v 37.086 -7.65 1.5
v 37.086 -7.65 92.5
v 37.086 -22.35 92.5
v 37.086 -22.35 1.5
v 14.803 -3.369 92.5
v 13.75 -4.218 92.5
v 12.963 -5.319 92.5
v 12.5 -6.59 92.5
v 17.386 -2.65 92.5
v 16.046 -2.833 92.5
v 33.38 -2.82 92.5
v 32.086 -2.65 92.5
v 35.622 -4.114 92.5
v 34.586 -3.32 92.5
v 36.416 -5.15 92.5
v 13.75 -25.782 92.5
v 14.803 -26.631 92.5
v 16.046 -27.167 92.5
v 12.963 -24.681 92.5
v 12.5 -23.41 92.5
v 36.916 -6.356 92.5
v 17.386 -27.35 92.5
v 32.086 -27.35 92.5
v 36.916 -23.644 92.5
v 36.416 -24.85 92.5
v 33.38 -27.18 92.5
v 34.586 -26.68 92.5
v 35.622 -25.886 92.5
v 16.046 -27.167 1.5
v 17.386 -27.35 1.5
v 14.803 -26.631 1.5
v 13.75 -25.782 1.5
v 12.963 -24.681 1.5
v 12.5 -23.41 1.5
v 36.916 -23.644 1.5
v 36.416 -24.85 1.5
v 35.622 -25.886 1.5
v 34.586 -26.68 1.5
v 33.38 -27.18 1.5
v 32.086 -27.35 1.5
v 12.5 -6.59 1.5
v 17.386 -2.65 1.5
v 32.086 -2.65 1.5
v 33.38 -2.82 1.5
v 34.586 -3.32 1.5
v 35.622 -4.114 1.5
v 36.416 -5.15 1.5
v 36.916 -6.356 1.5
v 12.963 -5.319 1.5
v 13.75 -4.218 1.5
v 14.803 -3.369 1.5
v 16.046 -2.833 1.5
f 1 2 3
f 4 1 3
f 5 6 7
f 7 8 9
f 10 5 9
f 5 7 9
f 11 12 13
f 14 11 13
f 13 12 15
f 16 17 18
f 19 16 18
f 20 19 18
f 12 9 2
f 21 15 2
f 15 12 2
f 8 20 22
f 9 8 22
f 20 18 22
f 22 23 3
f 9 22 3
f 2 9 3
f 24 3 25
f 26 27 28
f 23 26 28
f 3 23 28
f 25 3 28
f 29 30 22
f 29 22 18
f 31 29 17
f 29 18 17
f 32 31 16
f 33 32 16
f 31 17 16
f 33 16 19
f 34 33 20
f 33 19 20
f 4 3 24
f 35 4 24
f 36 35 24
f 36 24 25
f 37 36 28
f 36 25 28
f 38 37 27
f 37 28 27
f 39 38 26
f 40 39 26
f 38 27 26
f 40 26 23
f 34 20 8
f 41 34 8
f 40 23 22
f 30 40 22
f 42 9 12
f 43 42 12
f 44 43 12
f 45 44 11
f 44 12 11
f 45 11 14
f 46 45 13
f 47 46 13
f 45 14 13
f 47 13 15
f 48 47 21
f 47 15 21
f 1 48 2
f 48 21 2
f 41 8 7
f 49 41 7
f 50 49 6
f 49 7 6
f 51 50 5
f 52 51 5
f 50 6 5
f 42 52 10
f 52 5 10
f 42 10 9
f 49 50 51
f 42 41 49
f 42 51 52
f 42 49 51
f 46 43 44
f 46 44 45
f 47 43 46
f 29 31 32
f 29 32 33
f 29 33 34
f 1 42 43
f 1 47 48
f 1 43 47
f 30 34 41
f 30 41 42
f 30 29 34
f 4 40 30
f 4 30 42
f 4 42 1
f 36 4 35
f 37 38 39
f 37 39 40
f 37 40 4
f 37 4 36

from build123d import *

# Parameters (mm, degrees)
F0_W         = 80
F0_H         = 60
F1_DEPTH     = 130
F2_T         = -1.5
F3_W         = 1.5
F3_H         = 27
F4_DEPTH     = 91
F5_R         = 1
F6_W         = 17
F6_H         = 16
F6_W_2       = 1.5
F6_H_2       = 27
F7_DEPTH     = 2
F8_T1_DEPTH  = 92
F8_T3_DEPTH  = 29.9726896882
F8_S7_W      = 1
F8_S7_H      = 1
F8_T8_DEPTH  = 1
F8_T15_DEPTH = 29.9726896882
F8_T19_DEPTH = 94.5
F9_T1_DEPTH  = 127.5
F9_T3_DEPTH  = 58.5
F9_S7_W      = 1
F9_S7_H      = 1
F9_T8_DEPTH  = 1
F9_S13_W     = 1
F9_S13_H     = 1
F9_T14_DEPTH = 1
F9_T18_ANGLE = 90
F11_DEPTH    = 60
F12_DEPTH    = 60
F13_DEPTH    = 50
F14_R        = 2
F15_W        = 17
F15_H        = 16
F16_DEPTH    = 91


# Not quite as in the source:
# - a fillet or chamfer that OpenCascade refuses, or shapes differently, is made with other operations: its cross-section is extruded or revolved along the edge and cut away or added


with BuildPart() as f1:
    # F0 (on Top) → F1 (new body)
    with BuildSketch(Plane.XY):
        Rectangle(F0_W, F0_H)
    extrude(amount=F1_DEPTH)

    # F2
    f2_openings = [f1.faces().sort_by_distance(p)[0] for p in [
        (0, 0, 130),
    ]]
    offset(amount=F2_T, openings=f2_openings)

    # F3 (on face) → F4 (join)
    with BuildSketch(Plane.XY.offset(1.5)):
        with Locations((11.75, -15)):
            Rectangle(F3_W, F3_H)
    extrude(amount=F4_DEPTH)

    # F5
    f5_edges = [f1.edges().sort_by_distance(p)[0] for p in [
        (0, 28.5, 1.5),
        (-38.5, 0, 1.5),
        (-13.75, -28.5, 1.5),
        (11, -15, 1.5),
    ]]
    fillet(f5_edges, radius=F5_R)

    # F6 (on face) → F7 (join)
    with BuildSketch(Plane.XY.offset(92.5)):
        Polygon((38.4726896882, -1.5), (12.5, -1.5), (12.5, -28.5), (11, -28.5), (11, -28.532365337), (38.4726896882, -28.532365337), align=None)
        with Locations((24.7363448441, -15)):
            Rectangle(F6_W, F6_H, mode=Mode.SUBTRACT)
        with Locations((11.75, -15)):
            Rectangle(F6_W_2, F6_H_2)
    extrude(amount=F7_DEPTH)

    # F8: fillet of radius 1 on 2 edges, made by hand

    # F8_s2 → F8_t1 (join)
    with BuildSketch(Plane.XY.offset(2.5)):
        with BuildLine():
            ThreePointArc((10, -28.5), (10.7071067812, -28.2071067812), (11, -27.5))
            Line((11, -27.5), (11, -28.5))
            Line((11, -28.5), (10, -28.5))
        make_face()
    extrude(amount=F8_T1_DEPTH)

    # F8_s4 → F8_t3 (join)
    with BuildSketch(Plane.YZ.offset(11)):
        with BuildLine():
            ThreePointArc((-28.5, 95.5), (-28.2071067812, 94.7928932188), (-27.5, 94.5))
            Line((-27.5, 94.5), (-28.5, 94.5))
            Line((-28.5, 94.5), (-28.5, 95.5))
        make_face()
    extrude(amount=F8_T3_DEPTH)


with BuildPart() as f8_tool6:
    # F8_s7 → F8_t8 (new body)
    with BuildSketch(Plane.XZ.offset(27.5)):
        with Locations((10.5, 2)):
            Rectangle(F8_S7_W, F8_S7_H)
    extrude(amount=F8_T8_DEPTH)

    # F8_s9 → F8_t10 (revolve, cut)
    with BuildSketch(Plane(origin=(10, -27.5, 2.5), x_dir=(-0.7071067812, 0, 0.7071067812), z_dir=(0.7071067812, 0, 0.7071067812))):
        with BuildLine():
            ThreePointArc((0, -1), (1, 0), (0, 1))
            Line((0, 1), (0, -1))
        make_face()
    revolve(axis=Axis((10, -27.5, 2.5), (0, -1, 0)), mode=Mode.SUBTRACT)


with BuildPart() as f1_1:
    add(f1.part)

    # F8_t5: union F8_tool6
    add(f8_tool6.part)


with BuildPart() as f8_tool13:
    # F8_s14 → F8_t15 (new body)
    with BuildSketch(Plane.YZ.offset(8.5)):
        with BuildLine():
            ThreePointArc((-28.5, 95.5), (-28.2071067812, 94.7928932188), (-27.5, 94.5))
            Line((-27.5, 94.5), (-28.5, 94.5))
            Line((-28.5, 94.5), (-28.5, 95.5))
        make_face()
    extrude(amount=F8_T15_DEPTH)

    split(bisect_by=Plane.YZ.offset(11), keep=Keep.BOTTOM)


with BuildPart() as f8_tool17:
    # F8_s18 → F8_t19 (new body)
    with BuildSketch(Plane.XY.offset(97)):
        with BuildLine():
            ThreePointArc((10, -28.5), (10.7071067812, -28.2071067812), (11, -27.5))
            Line((11, -27.5), (11, -28.5))
            Line((11, -28.5), (10, -28.5))
        make_face()
    extrude(amount=-F8_T19_DEPTH)

    split(bisect_by=Plane.XY.offset(94.5), keep=Keep.TOP)


with BuildPart() as f8_tool13_1:
    add(f8_tool13.part)

    # F8_t21: intersect F8_tool17
    add(f8_tool17.part, mode=Mode.INTERSECT)


with BuildPart() as f1_2:
    add(f1_1.part)

    # F8_t11: union F8_tool13
    add(f8_tool13_1.part)

    # F9: fillet of radius 1 on 3 edges, made by hand

    # F9_s2 → F9_t1 (join)
    with BuildSketch(Plane.XY.offset(2.5)):
        with BuildLine():
            ThreePointArc((-37.5, -28.5), (-38.2071067812, -28.2071067812), (-38.5, -27.5))
            Line((-38.5, -27.5), (-38.5, -28.5))
            Line((-38.5, -28.5), (-37.5, -28.5))
        make_face()
        with BuildLine():
            ThreePointArc((-37.5, 28.5), (-38.2071067812, 28.2071067812), (-38.5, 27.5))
            Line((-38.5, 27.5), (-38.5, 28.5))
            Line((-38.5, 28.5), (-37.5, 28.5))
        make_face()
        with BuildLine():
            ThreePointArc((37.5, 28.5), (38.2071067812, 28.2071067812), (38.5, 27.5))
            Line((38.5, 27.5), (38.5, 28.5))
            Line((38.5, 28.5), (37.5, 28.5))
        make_face()
    extrude(amount=F9_T1_DEPTH)

    # F9_s4 → F9_t3 (join)
    with BuildSketch(Plane.XZ.offset(-27.5)):
        with BuildLine():
            ThreePointArc((38.5, 2.5), (38.2071067812, 1.7928932188), (37.5, 1.5))
            Line((37.5, 1.5), (38.5, 1.5))
            Line((38.5, 1.5), (38.5, 2.5))
        make_face()
    extrude(amount=F9_T3_DEPTH)


with BuildPart() as f9_tool6:
    # F9_s7 → F9_t8 (new body)
    with BuildSketch(Plane.XZ.offset(-27.5)):
        with Locations((-38, 2)):
            Rectangle(F9_S7_W, F9_S7_H)
    extrude(amount=-F9_T8_DEPTH)

    # F9_s9 → F9_t10 (revolve, cut)
    with BuildSketch(Plane(origin=(-37.5, 27.5, 2.5), x_dir=(0.7071067812, 0, 0.7071067812), z_dir=(-0.7071067812, 0, 0.7071067812))):
        with BuildLine():
            ThreePointArc((0, -1), (1, 0), (0, 1))
            Line((0, 1), (0, -1))
        make_face()
    revolve(axis=Axis((-37.5, 27.5, 2.5), (0, 1, 0)), mode=Mode.SUBTRACT)


with BuildPart() as f1_3:
    add(f1_2.part)

    # F9_t5: union F9_tool6
    add(f9_tool6.part)


with BuildPart() as f9_tool12:
    # F9_s13 → F9_t14 (new body)
    with BuildSketch(Plane.XZ.offset(27.5)):
        with Locations((-38, 2)):
            Rectangle(F9_S13_W, F9_S13_H)
    extrude(amount=F9_T14_DEPTH)

    # F9_s15 → F9_t16 (revolve, cut)
    with BuildSketch(Plane(origin=(-37.5, -27.5, 2.5), x_dir=(0.7071067812, 0, 0.7071067812), z_dir=(0.7071067812, 0, -0.7071067812))):
        with BuildLine():
            ThreePointArc((0, -1), (1, 0), (0, 1))
            Line((0, 1), (0, -1))
        make_face()
    revolve(axis=Axis((-37.5, -27.5, 2.5), (0, -1, 0)), mode=Mode.SUBTRACT)


with BuildPart() as f1_4:
    add(f1_3.part)

    # F9_t11: union F9_tool12
    add(f9_tool12.part)

    # F9_s17 → F9_t18 (revolve)
    with BuildSketch(Plane.XY.offset(2.5)):
        with BuildLine():
            ThreePointArc((38.5, 27.5), (38.2071067812, 28.2071067812), (37.5, 28.5))
            Line((37.5, 28.5), (38.5, 28.5))
            Line((38.5, 28.5), (38.5, 27.5))
        make_face()
    revolve(axis=Axis((38.5, 27.5, 2.5), (-1, 0, 0)), revolution_arc=F9_T18_ANGLE)

    # F10 (on face) → F11 (join)
    with BuildSketch(Plane(origin=(0, 30, 0), x_dir=(-1, 0, 0), z_dir=(0, 1, 0))):
        Polygon((-42.6013286531, 4), (-41.4004783891, 2.4006374993), (-42.6, 1.5), (-44.4770764343, 4), (-45, 4), (-45, 0), (-40, 0), (-40, 4), align=None)
    extrude(amount=-F11_DEPTH)

    # F10 (on face) → F12 (join)
    with BuildSketch(Plane(origin=(0, 30, 0), x_dir=(-1, 0, 0), z_dir=(0, 1, 0))):
        Polygon((-65.4174783693, 34.3878804557), (-64.0949453732, 32.6264537871), (-40, 32.6264537871), (-40, 35.6264537871), (-68, 35.6264537871), (-68, 32.6264537871), (-65.9706931543, 32.6264537871), (-66.6169999802, 33.4872429564), align=None)
    extrude(amount=-F12_DEPTH)

    # F14
    f14_edges = [f1_4.edges().sort_by_distance(p)[0] for p in [
        (40, 0, 35.626454),
        (40, 0, 4),
        (40, 0, 32.626454),
    ]]
    fillet(f14_edges, radius=F14_R)


with BuildPart() as f13:
    # F10 (on face) → F13 (new body)
    with BuildSketch(Plane(origin=(0, 30, 0), x_dir=(-1, 0, 0), z_dir=(0, 1, 0))):
        Polygon((-42.6, 1.5), (-41.4004783891, 2.4006374993), (-42.6013286531, 4), (-44.4770764343, 4), align=None)
        Polygon((-44.4770764343, 4), (-42.6013286531, 4), (-64.0949453732, 32.6264537871), (-65.9706931543, 32.6264537871), align=None)
        Polygon((-65.9706931543, 32.6264537871), (-64.0949453732, 32.6264537871), (-65.4174783693, 34.3878804557), (-66.6169999802, 33.4872429564), align=None)
    extrude(amount=-F13_DEPTH)


with BuildPart() as f16:
    # F15 (on face) → F16 (new body)
    with BuildSketch(Plane(origin=(0, 0, 92.5), x_dir=(1, 0, 0), z_dir=(0, 0, -1))):
        with BuildLine():
            ThreePointArc((12.5, 6.589983932), (14.2478802784, 3.7576947486), (17.3863448441, 2.65))
            Line((17.3863448441, 2.65), (32.0863448441, 2.65))
            ThreePointArc((32.0863448441, 2.65), (35.62187875, 4.1144660941), (37.0863448441, 7.65))
            Line((37.0863448441, 7.65), (37.0863448441, 22.35))
            ThreePointArc((37.0863448441, 22.35), (35.62187875, 25.8855339059), (32.0863448441, 27.35))
            Line((32.0863448441, 27.35), (17.3863448441, 27.35))
            ThreePointArc((17.3863448441, 27.35), (14.2478802784, 26.2423052514), (12.5, 23.410016068))
            Line((12.5, 23.410016068), (12.5, 6.589983932))
        make_face()
        with Locations((24.7363448441, 15)):
            Rectangle(F15_W, F15_H, mode=Mode.SUBTRACT)
        with Locations((24.7363448441, 15)):
            Rectangle(F15_W, F15_H)
    extrude(amount=F16_DEPTH)


solid = f16.part
